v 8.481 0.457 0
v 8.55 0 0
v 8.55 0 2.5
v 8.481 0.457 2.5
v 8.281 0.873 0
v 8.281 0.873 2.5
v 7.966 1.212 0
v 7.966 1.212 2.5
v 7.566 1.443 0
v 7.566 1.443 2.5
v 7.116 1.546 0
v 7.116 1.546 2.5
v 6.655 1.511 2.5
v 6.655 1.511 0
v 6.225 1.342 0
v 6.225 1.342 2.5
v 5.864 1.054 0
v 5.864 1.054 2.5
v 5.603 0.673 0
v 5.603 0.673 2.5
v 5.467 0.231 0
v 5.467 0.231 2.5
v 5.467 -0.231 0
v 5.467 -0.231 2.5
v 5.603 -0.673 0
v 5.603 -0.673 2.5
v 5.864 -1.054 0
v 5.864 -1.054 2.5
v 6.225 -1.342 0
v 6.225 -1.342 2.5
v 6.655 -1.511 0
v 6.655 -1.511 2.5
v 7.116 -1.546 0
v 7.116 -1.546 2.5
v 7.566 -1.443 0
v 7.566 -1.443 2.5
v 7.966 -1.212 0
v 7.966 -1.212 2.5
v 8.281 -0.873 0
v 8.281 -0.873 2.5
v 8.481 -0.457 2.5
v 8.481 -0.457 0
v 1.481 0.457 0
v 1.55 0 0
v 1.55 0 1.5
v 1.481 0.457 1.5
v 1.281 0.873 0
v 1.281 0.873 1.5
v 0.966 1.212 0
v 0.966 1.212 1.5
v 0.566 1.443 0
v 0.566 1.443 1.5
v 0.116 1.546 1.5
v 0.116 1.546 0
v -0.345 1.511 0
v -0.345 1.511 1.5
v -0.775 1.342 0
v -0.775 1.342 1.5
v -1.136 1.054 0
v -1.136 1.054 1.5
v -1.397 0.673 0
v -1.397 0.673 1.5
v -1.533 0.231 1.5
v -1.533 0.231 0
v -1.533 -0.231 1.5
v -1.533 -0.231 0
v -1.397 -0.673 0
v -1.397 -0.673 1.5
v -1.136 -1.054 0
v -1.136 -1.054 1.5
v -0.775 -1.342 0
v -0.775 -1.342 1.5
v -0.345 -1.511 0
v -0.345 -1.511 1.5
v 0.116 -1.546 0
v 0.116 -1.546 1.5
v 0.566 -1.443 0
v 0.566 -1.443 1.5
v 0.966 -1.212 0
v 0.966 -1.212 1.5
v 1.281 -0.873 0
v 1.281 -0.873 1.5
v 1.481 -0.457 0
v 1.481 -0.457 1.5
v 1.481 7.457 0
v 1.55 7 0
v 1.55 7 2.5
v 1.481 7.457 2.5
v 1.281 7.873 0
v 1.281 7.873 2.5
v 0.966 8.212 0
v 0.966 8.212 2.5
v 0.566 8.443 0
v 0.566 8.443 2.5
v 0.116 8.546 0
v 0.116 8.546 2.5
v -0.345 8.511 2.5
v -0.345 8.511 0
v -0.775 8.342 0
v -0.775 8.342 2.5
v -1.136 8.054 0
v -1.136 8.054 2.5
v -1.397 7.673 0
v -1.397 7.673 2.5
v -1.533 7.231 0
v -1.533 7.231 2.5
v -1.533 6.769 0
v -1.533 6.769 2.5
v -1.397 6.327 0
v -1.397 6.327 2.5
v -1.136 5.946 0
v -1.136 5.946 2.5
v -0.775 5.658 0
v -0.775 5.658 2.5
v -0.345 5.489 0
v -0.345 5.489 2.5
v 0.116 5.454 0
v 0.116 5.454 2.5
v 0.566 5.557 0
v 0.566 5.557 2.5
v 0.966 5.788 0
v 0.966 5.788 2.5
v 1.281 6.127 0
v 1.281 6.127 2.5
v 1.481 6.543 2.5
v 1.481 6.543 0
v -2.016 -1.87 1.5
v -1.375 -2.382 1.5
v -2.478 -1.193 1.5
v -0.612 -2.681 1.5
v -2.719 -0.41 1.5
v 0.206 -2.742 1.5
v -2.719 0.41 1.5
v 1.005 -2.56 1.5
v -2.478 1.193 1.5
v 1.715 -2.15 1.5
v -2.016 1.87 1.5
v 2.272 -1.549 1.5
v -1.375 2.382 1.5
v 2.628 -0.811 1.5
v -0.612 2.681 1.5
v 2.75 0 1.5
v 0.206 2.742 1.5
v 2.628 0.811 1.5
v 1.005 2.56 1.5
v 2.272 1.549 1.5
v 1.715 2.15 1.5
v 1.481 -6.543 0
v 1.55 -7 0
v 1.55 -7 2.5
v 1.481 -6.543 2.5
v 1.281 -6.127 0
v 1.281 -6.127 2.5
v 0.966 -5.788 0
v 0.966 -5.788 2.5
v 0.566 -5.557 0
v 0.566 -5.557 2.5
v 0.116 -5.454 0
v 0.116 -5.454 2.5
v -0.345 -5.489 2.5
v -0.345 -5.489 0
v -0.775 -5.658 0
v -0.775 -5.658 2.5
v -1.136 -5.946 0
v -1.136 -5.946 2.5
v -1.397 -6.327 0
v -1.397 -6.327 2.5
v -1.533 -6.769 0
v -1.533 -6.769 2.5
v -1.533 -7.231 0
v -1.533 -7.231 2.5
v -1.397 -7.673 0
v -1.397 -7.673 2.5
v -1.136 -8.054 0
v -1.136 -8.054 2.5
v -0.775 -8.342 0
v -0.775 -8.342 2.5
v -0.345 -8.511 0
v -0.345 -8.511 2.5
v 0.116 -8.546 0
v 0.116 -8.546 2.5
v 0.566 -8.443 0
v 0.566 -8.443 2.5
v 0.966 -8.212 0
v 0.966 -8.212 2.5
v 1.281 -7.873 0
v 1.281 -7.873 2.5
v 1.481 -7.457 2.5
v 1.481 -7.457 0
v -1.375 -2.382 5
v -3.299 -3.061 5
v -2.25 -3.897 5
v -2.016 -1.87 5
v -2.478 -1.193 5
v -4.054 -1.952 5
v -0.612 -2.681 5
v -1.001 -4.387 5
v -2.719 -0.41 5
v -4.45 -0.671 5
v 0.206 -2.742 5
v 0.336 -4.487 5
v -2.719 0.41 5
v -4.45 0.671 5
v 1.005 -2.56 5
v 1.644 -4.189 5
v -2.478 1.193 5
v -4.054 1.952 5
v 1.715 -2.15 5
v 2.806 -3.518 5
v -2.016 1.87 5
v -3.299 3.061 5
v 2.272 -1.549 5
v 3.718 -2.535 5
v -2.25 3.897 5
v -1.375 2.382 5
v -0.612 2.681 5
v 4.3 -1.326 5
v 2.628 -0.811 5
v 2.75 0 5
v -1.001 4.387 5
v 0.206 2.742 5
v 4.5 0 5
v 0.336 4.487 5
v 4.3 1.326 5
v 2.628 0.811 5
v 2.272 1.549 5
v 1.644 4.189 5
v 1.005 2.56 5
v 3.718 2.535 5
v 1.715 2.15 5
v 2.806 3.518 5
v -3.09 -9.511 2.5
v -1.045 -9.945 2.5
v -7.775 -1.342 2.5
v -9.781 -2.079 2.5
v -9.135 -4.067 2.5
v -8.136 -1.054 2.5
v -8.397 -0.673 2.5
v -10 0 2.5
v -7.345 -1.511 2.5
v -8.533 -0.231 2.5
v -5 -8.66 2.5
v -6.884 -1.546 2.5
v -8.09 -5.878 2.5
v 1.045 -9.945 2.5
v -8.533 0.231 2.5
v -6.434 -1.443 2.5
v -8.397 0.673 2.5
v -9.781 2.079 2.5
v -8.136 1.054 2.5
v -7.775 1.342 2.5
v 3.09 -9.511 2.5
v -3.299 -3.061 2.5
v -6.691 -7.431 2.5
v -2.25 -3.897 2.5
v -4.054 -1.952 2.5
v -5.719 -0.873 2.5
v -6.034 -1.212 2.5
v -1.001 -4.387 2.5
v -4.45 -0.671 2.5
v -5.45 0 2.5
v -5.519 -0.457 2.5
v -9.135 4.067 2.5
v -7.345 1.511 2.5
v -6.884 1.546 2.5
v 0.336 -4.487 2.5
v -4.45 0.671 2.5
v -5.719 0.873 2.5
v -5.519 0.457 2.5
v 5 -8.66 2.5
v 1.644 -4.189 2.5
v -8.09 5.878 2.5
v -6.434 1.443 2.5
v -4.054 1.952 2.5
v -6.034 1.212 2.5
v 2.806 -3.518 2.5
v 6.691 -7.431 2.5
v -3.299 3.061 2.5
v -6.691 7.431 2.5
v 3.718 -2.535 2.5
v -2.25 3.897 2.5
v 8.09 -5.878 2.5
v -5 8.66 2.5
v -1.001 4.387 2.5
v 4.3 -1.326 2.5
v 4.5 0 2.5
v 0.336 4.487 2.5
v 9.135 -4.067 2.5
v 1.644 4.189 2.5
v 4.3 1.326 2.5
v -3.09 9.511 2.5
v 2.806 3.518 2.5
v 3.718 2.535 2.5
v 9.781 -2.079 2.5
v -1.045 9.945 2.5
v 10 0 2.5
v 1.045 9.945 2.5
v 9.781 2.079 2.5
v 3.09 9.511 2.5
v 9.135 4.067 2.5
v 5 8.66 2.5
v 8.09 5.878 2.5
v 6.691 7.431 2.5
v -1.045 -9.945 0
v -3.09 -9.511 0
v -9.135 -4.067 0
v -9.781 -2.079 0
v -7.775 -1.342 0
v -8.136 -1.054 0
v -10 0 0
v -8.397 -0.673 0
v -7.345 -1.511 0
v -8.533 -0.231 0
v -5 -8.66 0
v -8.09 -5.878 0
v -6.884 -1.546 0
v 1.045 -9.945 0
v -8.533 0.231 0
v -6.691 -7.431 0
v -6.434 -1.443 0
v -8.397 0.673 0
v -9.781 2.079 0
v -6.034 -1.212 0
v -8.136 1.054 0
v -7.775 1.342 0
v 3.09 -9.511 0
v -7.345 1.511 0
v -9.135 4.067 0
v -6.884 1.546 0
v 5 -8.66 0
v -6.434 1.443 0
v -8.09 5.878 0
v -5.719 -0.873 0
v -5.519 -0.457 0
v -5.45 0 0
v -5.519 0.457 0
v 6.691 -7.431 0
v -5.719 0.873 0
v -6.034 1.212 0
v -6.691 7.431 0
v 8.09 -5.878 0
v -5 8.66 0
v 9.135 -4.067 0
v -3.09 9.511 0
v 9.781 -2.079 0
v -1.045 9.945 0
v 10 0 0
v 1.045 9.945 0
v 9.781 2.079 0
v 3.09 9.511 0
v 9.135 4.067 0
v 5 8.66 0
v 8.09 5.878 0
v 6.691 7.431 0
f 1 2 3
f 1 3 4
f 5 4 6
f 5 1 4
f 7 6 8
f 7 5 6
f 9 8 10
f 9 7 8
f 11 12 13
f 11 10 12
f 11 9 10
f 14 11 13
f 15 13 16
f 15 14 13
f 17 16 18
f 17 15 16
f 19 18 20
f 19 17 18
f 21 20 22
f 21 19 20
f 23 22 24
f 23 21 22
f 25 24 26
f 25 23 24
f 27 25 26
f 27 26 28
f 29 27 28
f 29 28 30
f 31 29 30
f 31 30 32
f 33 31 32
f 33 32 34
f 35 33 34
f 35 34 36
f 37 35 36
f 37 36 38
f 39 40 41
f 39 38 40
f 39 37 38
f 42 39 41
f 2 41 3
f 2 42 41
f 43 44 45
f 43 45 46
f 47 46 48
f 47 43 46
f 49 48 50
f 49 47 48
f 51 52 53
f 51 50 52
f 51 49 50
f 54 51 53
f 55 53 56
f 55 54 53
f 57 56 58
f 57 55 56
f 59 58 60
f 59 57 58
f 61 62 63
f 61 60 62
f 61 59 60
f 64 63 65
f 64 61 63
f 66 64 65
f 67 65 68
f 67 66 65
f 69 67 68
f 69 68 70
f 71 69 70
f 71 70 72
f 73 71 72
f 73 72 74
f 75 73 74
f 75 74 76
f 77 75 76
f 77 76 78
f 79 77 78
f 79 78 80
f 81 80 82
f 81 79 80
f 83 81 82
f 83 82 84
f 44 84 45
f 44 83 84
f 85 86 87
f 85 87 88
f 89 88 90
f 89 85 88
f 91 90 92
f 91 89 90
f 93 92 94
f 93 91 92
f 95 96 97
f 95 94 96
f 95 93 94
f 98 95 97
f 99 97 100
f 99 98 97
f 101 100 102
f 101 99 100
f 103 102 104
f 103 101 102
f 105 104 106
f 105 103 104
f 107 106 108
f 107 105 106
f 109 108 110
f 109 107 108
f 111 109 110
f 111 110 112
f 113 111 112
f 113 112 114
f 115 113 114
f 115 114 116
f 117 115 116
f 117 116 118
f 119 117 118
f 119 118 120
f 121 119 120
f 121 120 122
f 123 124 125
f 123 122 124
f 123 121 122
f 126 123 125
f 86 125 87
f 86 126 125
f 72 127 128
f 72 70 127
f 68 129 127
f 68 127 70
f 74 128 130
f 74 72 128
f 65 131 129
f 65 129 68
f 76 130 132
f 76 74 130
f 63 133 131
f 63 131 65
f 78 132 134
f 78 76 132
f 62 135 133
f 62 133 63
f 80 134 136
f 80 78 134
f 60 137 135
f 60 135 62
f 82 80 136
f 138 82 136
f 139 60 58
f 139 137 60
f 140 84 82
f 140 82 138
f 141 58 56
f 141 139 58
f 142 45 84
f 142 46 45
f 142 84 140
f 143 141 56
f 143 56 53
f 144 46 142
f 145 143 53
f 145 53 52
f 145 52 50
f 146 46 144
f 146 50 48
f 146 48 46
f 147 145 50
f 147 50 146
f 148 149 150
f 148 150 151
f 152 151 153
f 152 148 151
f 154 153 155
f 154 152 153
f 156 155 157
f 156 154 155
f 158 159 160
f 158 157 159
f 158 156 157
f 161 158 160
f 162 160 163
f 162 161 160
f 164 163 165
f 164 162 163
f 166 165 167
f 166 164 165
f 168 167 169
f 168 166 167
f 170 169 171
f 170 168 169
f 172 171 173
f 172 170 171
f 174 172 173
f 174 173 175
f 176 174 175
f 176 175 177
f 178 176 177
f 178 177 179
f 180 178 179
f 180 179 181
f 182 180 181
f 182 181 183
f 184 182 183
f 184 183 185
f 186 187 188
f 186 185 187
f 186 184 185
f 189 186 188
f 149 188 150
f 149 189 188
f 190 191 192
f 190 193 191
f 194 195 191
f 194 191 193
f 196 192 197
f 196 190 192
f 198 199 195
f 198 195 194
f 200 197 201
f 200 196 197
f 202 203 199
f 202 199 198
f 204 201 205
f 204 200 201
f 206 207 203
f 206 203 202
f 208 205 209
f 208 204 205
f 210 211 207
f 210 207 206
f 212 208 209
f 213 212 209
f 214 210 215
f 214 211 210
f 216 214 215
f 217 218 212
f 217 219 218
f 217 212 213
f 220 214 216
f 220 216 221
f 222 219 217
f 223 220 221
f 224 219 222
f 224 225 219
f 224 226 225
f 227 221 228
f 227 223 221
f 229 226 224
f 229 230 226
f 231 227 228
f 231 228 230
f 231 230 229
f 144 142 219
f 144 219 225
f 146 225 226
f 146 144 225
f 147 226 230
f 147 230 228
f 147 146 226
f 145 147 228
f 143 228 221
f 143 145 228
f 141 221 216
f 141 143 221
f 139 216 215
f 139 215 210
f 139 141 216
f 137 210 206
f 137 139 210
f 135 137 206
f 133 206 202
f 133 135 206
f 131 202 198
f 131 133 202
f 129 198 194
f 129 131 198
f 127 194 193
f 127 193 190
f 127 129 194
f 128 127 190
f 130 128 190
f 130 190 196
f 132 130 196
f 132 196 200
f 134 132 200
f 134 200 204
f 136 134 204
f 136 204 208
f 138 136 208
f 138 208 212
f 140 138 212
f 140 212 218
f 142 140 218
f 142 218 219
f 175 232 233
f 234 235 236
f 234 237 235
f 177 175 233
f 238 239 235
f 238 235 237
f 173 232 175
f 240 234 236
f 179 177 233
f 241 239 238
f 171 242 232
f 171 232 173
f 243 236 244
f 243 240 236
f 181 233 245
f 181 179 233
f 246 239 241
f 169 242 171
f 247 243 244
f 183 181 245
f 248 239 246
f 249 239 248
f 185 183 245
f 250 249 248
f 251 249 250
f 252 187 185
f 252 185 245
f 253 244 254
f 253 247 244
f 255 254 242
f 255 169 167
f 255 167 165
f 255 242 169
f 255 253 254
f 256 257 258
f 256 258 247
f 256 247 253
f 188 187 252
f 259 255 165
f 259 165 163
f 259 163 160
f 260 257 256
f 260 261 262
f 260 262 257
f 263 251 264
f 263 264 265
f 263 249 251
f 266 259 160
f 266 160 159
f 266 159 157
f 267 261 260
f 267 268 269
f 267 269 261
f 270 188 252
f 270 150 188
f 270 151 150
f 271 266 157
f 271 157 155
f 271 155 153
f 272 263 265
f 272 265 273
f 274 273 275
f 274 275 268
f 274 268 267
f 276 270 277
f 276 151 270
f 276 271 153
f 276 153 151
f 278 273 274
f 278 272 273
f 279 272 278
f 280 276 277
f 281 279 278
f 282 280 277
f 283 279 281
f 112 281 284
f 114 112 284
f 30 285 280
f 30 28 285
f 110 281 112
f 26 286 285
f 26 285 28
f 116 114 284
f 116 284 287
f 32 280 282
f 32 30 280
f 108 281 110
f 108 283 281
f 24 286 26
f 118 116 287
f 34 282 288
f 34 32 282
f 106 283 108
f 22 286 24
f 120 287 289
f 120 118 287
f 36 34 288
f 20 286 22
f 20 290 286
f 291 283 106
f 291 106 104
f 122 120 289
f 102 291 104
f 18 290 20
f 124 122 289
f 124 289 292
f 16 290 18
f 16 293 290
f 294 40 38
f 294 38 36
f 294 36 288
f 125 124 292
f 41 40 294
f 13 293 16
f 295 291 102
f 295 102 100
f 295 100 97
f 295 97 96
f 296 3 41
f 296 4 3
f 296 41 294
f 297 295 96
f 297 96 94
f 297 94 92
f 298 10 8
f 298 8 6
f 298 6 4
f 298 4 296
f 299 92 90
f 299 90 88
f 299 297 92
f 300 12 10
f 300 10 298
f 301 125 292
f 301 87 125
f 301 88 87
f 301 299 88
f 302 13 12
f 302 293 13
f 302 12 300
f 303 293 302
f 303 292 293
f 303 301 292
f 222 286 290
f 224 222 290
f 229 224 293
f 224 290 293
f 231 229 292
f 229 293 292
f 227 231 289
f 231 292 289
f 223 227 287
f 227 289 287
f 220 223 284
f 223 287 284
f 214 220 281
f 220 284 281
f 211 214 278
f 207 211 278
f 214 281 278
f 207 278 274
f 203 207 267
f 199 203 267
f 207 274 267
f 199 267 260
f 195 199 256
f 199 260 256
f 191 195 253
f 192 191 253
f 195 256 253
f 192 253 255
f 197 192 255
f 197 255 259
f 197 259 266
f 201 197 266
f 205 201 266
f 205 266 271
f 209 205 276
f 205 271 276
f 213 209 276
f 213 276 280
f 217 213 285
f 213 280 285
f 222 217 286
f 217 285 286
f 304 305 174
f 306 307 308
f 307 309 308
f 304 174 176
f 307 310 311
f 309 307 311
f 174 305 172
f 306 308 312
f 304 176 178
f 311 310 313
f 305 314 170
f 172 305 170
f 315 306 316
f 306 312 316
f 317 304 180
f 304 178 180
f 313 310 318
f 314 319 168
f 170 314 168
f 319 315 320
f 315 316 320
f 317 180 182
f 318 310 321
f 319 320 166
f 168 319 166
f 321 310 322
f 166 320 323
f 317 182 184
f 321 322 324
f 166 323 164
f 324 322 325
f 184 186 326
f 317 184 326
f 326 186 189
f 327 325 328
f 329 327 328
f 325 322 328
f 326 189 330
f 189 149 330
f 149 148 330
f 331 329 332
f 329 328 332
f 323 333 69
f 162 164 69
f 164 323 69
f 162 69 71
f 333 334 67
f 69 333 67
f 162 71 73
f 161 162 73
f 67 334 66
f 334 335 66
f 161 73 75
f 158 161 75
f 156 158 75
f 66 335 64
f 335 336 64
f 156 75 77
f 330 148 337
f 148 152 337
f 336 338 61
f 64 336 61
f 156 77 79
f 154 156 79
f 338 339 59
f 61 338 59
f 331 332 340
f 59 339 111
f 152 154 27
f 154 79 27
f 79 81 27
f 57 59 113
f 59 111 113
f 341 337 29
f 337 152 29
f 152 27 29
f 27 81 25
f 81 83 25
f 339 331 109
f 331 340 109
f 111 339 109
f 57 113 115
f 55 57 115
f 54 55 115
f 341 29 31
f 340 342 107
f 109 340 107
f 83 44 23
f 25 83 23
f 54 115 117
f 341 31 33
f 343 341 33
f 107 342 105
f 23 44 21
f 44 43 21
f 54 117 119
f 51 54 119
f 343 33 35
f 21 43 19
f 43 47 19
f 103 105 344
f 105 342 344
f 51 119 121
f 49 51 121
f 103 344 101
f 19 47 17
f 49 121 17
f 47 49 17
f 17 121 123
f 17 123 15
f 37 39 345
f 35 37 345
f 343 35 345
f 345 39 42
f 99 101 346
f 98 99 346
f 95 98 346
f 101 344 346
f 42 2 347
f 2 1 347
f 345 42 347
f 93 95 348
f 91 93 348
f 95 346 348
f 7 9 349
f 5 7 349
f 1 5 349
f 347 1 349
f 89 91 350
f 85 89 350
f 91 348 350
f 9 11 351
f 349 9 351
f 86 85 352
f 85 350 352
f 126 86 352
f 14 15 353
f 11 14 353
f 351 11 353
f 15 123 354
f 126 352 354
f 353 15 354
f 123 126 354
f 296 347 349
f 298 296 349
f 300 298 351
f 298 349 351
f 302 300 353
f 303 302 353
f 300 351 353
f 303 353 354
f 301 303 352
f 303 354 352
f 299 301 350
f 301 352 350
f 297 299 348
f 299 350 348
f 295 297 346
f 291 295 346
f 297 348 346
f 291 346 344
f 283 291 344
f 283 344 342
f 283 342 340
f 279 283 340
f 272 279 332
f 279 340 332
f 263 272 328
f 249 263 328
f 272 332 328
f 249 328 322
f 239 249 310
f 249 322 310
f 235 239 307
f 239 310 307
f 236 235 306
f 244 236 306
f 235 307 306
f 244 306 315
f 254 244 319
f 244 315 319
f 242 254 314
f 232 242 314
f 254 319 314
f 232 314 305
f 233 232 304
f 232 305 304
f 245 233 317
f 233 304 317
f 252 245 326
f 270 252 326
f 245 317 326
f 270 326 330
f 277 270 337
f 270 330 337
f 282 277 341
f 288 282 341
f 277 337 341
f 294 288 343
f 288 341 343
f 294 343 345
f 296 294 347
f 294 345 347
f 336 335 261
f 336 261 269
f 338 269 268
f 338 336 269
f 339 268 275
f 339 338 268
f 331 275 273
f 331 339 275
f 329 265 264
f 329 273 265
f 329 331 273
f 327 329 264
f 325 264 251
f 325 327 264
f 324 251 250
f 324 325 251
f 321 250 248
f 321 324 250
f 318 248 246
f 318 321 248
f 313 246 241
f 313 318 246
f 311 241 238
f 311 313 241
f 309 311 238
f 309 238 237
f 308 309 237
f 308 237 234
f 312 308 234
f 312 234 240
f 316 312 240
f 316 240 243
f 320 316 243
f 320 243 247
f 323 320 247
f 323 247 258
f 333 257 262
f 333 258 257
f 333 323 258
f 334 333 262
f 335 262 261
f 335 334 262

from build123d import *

# Parameters (mm, degrees)
SKETCH1_R               = 10
BOSS_EXTRUDE1_DEPTH     = 2.5
SKETCH2_R               = 4.5
SKETCH2_R_2             = 2.75
EXTRUDE_THIN1_DEPTH     = 2.5
CUT_EXTRUDE1_DEPTH      = 15.361406616
CUT_EXTRUDE1_DEPTH_BACK = 15.361406616
SKETCH3_R               = 1.55
CUT_EXTRUDE2_START      = -1
SKETCH4_R               = 2.75
CUT_EXTRUDE2_DEPTH      = 1


with BuildPart() as part:
    # Sketch1 → Boss-Extrude1 (new body)
    with BuildSketch(Plane(origin=(0, 0, 0), x_dir=(0, 1, 0), z_dir=(0, 0, 1))):
        with Locations(Location((0, 0, 0), (0, 0, 270))):
            Circle(SKETCH1_R)
    extrude(amount=BOSS_EXTRUDE1_DEPTH)

    # Sketch2 → Extrude-Thin1 (add)
    with BuildSketch(Plane.XY.offset(2.5)):
        Circle(SKETCH2_R)
        Circle(SKETCH2_R_2, mode=Mode.SUBTRACT)
    extrude(amount=EXTRUDE_THIN1_DEPTH)

    # Sketch3 → Cut-Extrude1 (cut, two sides: drawn at the far end of the back side and taken through both)
    with BuildSketch(Plane.XY.offset(2.5).offset(-CUT_EXTRUDE1_DEPTH_BACK)):
        Circle(SKETCH3_R)
        with Locations((7, 0)):
            Circle(SKETCH3_R)
        with Locations((0, 7)):
            Circle(SKETCH3_R)
        with Locations((-7, 0)):
            Circle(SKETCH3_R)
        with Locations((0, -7)):
            Circle(SKETCH3_R)
    extrude(amount=CUT_EXTRUDE1_DEPTH + CUT_EXTRUDE1_DEPTH_BACK, mode=Mode.SUBTRACT)

    # Sketch4 → Cut-Extrude2 (cut)
    with BuildSketch(Plane.XY.offset(2.5).offset(CUT_EXTRUDE2_START)):
        Circle(SKETCH4_R)
    extrude(amount=CUT_EXTRUDE2_DEPTH, mode=Mode.SUBTRACT)


solid = part.part
